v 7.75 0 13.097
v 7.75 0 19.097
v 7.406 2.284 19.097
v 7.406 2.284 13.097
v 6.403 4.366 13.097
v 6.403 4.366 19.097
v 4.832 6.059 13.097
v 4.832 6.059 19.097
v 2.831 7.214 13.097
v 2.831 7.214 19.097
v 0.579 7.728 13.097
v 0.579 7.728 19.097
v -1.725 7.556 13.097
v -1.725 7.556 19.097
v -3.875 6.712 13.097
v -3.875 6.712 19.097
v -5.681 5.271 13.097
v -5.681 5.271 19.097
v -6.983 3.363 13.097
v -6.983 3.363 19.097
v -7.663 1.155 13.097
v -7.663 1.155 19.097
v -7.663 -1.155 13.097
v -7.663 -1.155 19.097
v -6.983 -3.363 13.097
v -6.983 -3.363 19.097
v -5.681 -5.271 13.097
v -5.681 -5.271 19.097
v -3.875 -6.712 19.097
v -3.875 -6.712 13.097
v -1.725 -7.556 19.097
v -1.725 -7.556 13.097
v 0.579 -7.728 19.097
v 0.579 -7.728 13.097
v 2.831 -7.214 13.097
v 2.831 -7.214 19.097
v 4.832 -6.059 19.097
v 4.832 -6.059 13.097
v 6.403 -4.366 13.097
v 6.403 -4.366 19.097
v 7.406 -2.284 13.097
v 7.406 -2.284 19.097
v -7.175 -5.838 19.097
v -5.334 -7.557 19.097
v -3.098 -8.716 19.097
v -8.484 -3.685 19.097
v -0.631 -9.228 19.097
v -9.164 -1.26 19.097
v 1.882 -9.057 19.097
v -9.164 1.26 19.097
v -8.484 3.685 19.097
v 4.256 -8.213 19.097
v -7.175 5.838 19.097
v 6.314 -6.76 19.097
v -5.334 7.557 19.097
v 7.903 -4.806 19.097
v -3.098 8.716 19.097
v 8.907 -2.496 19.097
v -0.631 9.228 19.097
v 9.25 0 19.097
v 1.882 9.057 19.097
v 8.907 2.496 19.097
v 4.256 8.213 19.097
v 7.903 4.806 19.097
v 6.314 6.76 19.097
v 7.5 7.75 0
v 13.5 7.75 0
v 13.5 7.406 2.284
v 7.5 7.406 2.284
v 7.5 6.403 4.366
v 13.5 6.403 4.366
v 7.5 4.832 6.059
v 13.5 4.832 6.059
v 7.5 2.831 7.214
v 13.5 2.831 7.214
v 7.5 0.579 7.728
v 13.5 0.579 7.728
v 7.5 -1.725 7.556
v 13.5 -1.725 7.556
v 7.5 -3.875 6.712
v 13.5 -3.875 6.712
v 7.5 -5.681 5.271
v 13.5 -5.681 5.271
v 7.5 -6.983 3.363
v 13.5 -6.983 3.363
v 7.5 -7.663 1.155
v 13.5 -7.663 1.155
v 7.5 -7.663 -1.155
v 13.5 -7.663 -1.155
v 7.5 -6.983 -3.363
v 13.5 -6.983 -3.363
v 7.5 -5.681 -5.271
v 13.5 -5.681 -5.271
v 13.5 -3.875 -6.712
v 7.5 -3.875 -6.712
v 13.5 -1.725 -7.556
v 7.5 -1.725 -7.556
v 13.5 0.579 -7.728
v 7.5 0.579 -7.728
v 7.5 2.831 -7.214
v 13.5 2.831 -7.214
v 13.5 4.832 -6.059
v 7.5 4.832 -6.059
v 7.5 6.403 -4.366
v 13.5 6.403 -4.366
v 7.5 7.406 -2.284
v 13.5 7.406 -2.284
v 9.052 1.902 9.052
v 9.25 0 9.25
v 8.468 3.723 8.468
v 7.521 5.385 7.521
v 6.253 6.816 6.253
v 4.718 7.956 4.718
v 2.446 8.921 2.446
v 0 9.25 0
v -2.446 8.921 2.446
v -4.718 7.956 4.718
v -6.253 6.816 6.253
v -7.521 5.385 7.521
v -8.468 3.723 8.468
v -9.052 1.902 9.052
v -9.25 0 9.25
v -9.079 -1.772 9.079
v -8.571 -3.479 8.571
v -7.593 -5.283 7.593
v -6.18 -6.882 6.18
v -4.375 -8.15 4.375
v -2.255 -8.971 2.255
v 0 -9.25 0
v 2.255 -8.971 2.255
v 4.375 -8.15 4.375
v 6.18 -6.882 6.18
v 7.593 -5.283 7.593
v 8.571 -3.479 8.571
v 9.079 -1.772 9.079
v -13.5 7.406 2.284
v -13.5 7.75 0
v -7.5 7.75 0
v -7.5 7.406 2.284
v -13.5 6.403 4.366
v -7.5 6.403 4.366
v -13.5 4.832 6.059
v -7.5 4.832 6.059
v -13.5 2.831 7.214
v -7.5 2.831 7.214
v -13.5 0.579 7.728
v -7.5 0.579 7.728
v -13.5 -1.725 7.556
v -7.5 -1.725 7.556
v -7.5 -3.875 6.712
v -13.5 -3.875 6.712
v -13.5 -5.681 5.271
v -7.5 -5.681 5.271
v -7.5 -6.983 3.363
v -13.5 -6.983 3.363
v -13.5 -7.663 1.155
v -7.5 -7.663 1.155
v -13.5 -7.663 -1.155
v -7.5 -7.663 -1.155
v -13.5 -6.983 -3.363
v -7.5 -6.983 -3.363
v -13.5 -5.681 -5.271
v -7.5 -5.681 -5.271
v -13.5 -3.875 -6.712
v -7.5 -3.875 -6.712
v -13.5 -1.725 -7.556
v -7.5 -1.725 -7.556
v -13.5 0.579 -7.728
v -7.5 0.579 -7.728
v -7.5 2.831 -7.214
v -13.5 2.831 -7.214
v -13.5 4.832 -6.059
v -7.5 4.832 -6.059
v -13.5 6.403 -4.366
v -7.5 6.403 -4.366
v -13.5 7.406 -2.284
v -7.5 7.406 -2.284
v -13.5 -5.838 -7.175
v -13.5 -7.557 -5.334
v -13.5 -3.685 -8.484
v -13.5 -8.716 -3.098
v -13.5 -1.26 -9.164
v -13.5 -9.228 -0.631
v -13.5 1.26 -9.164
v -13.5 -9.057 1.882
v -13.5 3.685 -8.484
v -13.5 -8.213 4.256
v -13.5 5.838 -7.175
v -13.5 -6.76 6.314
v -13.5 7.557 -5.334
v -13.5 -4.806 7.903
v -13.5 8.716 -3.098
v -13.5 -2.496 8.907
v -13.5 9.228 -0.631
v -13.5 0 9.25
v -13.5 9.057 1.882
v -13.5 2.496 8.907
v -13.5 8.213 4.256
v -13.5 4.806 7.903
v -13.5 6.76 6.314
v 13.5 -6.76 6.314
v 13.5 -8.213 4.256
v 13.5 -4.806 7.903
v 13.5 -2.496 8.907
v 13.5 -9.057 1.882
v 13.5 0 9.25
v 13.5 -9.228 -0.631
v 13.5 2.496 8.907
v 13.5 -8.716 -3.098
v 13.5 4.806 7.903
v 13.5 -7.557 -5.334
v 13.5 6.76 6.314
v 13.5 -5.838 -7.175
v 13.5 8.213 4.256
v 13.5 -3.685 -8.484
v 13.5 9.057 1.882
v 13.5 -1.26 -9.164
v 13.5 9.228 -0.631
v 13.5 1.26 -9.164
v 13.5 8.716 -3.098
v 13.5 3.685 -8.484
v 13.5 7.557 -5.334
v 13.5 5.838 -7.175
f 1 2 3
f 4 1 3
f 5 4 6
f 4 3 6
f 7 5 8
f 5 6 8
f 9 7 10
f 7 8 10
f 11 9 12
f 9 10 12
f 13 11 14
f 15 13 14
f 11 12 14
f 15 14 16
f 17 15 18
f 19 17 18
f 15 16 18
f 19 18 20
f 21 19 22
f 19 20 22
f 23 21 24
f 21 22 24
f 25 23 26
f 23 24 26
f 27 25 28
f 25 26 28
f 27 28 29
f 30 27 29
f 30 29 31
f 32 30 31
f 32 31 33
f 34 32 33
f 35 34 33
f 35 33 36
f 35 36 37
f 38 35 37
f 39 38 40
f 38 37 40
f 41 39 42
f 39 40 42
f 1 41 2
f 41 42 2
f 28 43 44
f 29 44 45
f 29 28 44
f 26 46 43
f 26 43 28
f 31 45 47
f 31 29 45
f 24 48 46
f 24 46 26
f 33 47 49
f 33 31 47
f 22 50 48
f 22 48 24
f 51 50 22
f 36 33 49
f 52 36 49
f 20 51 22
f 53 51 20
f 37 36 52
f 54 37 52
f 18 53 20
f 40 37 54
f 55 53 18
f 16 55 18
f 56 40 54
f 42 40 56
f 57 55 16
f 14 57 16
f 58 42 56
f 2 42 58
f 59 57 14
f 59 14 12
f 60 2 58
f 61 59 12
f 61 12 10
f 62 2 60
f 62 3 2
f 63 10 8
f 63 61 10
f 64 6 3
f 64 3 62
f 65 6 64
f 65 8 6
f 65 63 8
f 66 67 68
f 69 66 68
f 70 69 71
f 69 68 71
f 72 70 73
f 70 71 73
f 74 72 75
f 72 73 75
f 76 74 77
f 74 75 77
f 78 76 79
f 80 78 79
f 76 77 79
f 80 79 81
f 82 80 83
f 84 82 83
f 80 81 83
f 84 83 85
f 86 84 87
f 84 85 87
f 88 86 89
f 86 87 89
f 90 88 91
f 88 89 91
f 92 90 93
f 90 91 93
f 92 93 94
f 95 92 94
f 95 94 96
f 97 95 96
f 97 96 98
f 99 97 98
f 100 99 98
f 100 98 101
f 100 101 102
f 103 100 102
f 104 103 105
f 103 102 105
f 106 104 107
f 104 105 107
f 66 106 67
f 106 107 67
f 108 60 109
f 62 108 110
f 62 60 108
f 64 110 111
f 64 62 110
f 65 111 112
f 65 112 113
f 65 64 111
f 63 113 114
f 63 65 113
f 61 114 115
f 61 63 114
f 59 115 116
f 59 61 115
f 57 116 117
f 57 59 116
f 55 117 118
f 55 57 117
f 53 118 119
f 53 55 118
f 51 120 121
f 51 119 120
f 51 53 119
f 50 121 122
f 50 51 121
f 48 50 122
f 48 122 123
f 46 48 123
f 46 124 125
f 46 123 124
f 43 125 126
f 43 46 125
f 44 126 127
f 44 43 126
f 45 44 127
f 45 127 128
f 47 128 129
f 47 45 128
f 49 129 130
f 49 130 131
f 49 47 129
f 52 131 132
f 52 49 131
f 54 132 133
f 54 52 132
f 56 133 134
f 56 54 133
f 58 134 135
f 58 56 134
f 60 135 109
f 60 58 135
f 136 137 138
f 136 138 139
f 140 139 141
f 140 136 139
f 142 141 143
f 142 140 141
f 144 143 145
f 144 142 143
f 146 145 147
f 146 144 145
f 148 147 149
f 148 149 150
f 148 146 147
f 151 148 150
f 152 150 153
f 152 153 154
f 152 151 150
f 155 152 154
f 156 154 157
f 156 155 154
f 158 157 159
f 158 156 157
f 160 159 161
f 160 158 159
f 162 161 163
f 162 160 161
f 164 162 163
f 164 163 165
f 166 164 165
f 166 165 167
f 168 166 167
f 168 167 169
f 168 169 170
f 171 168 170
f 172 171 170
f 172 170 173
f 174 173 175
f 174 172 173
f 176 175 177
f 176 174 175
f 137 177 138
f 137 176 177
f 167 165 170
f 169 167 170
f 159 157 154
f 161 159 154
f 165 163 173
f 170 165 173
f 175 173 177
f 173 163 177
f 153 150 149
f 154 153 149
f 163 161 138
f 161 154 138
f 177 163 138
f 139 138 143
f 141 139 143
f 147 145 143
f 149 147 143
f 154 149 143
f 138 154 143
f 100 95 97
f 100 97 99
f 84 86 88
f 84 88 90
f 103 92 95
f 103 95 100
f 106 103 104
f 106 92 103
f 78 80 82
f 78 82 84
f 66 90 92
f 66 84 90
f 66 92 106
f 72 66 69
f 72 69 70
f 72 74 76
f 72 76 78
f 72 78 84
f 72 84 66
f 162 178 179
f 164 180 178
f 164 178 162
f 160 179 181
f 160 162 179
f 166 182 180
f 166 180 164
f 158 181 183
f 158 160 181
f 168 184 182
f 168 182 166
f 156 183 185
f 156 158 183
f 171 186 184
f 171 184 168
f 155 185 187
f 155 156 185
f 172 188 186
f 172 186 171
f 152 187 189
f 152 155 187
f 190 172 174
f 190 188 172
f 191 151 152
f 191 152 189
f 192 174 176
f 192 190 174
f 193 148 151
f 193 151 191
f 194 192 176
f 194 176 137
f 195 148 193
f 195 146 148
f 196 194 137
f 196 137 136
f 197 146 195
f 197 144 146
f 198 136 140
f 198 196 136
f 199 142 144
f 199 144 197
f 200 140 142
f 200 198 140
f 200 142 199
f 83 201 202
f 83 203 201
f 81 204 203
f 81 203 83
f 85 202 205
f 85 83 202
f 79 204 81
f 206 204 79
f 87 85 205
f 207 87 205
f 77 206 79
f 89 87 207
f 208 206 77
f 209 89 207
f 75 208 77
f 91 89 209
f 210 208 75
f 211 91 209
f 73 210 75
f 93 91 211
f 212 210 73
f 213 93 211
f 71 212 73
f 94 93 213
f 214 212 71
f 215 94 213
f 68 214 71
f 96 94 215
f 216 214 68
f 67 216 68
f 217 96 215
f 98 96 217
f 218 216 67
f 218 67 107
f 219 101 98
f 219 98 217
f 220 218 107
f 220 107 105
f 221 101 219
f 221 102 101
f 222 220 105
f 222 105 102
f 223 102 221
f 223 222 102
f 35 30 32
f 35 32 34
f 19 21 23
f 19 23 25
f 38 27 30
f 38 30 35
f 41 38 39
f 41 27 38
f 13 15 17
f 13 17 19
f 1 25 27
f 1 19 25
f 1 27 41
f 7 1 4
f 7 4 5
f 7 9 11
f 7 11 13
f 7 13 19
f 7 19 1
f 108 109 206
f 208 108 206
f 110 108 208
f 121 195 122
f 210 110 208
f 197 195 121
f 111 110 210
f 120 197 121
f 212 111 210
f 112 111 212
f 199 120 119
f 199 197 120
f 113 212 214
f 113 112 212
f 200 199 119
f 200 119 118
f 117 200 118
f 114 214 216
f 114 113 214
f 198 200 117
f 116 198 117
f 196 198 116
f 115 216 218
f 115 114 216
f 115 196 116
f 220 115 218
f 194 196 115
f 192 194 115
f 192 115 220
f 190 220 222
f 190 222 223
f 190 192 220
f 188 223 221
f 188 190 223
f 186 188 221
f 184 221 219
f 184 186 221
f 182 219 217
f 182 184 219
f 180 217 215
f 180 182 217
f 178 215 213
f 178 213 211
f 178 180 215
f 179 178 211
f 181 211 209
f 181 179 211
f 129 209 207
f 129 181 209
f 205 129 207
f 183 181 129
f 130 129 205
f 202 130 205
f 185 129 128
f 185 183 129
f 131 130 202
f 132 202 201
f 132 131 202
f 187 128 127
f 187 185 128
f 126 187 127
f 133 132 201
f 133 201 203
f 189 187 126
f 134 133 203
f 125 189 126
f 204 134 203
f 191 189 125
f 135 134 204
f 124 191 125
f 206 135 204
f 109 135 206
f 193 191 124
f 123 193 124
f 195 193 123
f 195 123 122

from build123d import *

# Parameters (mm, degrees)
F4_R     = 7.75
F5_DEPTH = 6
F6_R     = 7.75
F7_DEPTH = 6


# Not quite as in the source:
# - a pattern or mirror of a feature is missing from the dataset's text; its kind, count and spacing are read off the source's solid


with BuildPart() as f1:
    # F0 (on Front) → F1 (revolve)
    with BuildSketch(Plane.XZ):
        Polygon((13.5, 9.25), (0, 9.25), (-13.5, 9.25), (-13.5, 0), (0, 0), (13.5, 0), align=None)
    revolve(axis=Axis((6.75, 0, 0), (-1, 0, 0)))

    # F2 (on Front) → F3 (revolve)
    with BuildSketch(Plane.XZ):
        Polygon((9.25, 19.0967741935), (0, 19.0967741935), (0, 8.3548387097), (0, 0), (9.25, 0), (9.25, 8.3548387097), align=None)
    revolve(axis=Axis((0, 0, 13.7258064516), (0, 0, 1)))

    # F4 (on face) → F5 (cut)
    with BuildSketch(Plane.YZ.offset(13.5)):
        Circle(F4_R)
    f5 = extrude(amount=-F5_DEPTH, mode=Mode.SUBTRACT)

    # F5_copies: F5 across plane
    add(f5.mirror(Plane(origin=(0, 0, 0), x_dir=(0, 0, -1), z_dir=(-1, 0, 0))), mode=Mode.SUBTRACT)

    # F6 (on face) → F7 (cut)
    with BuildSketch(Plane.XY.offset(19.0967741935)):
        Circle(F6_R)
    extrude(amount=-F7_DEPTH, mode=Mode.SUBTRACT)


solid = f1.part
